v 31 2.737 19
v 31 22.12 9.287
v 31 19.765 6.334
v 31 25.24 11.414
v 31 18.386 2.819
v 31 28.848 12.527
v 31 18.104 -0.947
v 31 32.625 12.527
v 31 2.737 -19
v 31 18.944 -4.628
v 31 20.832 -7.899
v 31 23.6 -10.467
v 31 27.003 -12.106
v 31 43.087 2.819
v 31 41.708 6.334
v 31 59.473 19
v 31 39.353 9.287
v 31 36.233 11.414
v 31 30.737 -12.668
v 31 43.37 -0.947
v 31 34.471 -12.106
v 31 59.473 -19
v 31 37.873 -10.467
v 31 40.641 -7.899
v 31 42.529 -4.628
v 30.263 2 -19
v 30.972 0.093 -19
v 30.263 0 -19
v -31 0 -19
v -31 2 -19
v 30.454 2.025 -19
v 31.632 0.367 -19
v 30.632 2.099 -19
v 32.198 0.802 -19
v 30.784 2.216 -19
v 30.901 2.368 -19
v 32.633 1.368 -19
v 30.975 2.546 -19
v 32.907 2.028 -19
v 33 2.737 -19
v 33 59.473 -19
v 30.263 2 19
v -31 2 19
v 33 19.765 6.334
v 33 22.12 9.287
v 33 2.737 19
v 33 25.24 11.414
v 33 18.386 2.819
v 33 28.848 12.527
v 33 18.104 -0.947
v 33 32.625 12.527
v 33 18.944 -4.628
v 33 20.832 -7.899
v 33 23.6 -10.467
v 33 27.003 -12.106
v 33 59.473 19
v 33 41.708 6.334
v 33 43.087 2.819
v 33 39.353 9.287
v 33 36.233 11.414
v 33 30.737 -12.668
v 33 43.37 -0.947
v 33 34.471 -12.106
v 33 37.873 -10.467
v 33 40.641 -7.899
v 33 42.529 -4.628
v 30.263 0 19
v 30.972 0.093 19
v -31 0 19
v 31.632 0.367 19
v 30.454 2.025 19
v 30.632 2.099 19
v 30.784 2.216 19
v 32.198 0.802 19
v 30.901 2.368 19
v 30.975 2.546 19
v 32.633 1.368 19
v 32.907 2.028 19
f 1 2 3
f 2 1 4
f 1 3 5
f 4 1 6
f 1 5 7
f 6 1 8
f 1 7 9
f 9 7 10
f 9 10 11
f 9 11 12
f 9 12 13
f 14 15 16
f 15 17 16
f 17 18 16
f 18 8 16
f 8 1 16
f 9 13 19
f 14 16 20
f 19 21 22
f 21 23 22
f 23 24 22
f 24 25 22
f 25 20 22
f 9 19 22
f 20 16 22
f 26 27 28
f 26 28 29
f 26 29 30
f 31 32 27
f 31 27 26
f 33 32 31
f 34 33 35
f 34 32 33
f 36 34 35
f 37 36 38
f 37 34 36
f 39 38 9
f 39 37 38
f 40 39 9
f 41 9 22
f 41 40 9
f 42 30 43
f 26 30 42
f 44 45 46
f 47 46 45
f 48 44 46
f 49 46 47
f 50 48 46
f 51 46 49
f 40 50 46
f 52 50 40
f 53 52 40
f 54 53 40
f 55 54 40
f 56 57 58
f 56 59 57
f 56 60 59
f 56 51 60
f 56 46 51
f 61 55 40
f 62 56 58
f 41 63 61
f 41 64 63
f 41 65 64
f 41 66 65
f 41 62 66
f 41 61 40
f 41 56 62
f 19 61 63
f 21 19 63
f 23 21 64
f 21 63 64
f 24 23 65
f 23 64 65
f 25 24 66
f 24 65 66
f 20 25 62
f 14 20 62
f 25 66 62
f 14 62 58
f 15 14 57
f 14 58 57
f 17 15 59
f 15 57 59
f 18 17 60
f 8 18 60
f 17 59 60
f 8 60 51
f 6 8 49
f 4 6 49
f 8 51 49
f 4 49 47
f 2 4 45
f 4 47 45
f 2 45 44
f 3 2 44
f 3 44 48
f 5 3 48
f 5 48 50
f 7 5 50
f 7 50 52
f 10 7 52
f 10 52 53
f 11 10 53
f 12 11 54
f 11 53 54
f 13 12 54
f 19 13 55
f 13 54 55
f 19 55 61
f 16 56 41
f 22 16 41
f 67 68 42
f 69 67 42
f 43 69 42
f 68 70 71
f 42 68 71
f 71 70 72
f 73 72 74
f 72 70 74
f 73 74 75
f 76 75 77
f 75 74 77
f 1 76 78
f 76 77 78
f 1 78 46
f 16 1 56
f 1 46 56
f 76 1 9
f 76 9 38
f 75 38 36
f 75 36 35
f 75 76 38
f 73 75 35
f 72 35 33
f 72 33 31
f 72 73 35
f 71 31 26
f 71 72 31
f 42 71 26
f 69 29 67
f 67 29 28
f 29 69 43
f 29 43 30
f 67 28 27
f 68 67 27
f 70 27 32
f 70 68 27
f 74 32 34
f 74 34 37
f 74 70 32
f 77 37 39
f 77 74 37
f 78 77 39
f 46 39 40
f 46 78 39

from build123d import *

# Parameters (mm, degrees)
SKETCH_1_W                       = 62
SKETCH_1_H                       = 38
SM_BASE_FLANGE_1_DEPTH           = 2
SM_EDGE_FLANGE_1_STRIP_W         = 9.4732
SM_EDGE_FLANGE_1_STRIP_H         = 2
SM_EDGE_FLANGE_1_STRIP_CUT_DEPTH = 38
SM_EDGE_FLANGE_1_DEPTH           = 38
SM_START                         = 2
SM_EDGE_FLANGE_1_PROFILE_W       = 38
SM_EDGE_FLANGE_1_PROFILE_H       = 56.7366
SM_EDGE_FLANGE_1_PROFILE_R       = 12.668336417
SM_EDGE_FLANGE_1_FLAT_DEPTH      = 2


# Sheet-metal steps are written as plain solids
with BuildPart() as part:
    # Sketch 1 → 基材-凸緣1 (new body)
    with BuildSketch(Plane(origin=(0, 0, 0), x_dir=(1, 0, 0), z_dir=(0, 1, 0))):
        Rectangle(SKETCH_1_W, SKETCH_1_H)
    extrude(amount=SM_BASE_FLANGE_1_DEPTH)

    # 邊線-凸緣1 strip (across the edge) → 邊線-凸緣1 strip cut (cut)
    with BuildSketch(Plane(origin=(31, 2, 19), x_dir=(-1, 0, 0), z_dir=(0, 0, -1))):
        with Locations((-4, -1)):
            Rectangle(SM_EDGE_FLANGE_1_STRIP_W, SM_EDGE_FLANGE_1_STRIP_H)
    extrude(amount=SM_EDGE_FLANGE_1_STRIP_CUT_DEPTH, mode=Mode.SUBTRACT)

    # 邊線-凸緣1 bend section (across the edge) → 邊線-凸緣1 (add)
    with BuildSketch(Plane(origin=(31, 2, 19), x_dir=(-1, 0, 0), z_dir=(0, 0, -1))):
        with BuildLine():
            Line((-2, 0.7366), (0, 0.7366))
            ThreePointArc((0, 0.7366), (0.215745145, 0.215745145), (0.7366, 0))
            Line((0.7366, 0), (0.7366, -2))
            ThreePointArc((0.7366, -2), (-1.198468417, -1.198468417), (-2, 0.7366))
        make_face()
    extrude(amount=SM_EDGE_FLANGE_1_DEPTH)

    # 邊線-凸緣1 profile (on flange) → 邊線-凸緣1 flat (add)
    with BuildSketch(Plane(origin=(31, 2, 0), x_dir=(0, 0, -1), z_dir=(1, 0, 0)).offset(SM_START)):
        with Locations((0, 29.1049)):
            Rectangle(SM_EDGE_FLANGE_1_PROFILE_W, SM_EDGE_FLANGE_1_PROFILE_H)
        with Locations((0, 28.7366)):
            Circle(SM_EDGE_FLANGE_1_PROFILE_R, mode=Mode.SUBTRACT)
    extrude(amount=-SM_EDGE_FLANGE_1_FLAT_DEPTH)


solid = part.part
